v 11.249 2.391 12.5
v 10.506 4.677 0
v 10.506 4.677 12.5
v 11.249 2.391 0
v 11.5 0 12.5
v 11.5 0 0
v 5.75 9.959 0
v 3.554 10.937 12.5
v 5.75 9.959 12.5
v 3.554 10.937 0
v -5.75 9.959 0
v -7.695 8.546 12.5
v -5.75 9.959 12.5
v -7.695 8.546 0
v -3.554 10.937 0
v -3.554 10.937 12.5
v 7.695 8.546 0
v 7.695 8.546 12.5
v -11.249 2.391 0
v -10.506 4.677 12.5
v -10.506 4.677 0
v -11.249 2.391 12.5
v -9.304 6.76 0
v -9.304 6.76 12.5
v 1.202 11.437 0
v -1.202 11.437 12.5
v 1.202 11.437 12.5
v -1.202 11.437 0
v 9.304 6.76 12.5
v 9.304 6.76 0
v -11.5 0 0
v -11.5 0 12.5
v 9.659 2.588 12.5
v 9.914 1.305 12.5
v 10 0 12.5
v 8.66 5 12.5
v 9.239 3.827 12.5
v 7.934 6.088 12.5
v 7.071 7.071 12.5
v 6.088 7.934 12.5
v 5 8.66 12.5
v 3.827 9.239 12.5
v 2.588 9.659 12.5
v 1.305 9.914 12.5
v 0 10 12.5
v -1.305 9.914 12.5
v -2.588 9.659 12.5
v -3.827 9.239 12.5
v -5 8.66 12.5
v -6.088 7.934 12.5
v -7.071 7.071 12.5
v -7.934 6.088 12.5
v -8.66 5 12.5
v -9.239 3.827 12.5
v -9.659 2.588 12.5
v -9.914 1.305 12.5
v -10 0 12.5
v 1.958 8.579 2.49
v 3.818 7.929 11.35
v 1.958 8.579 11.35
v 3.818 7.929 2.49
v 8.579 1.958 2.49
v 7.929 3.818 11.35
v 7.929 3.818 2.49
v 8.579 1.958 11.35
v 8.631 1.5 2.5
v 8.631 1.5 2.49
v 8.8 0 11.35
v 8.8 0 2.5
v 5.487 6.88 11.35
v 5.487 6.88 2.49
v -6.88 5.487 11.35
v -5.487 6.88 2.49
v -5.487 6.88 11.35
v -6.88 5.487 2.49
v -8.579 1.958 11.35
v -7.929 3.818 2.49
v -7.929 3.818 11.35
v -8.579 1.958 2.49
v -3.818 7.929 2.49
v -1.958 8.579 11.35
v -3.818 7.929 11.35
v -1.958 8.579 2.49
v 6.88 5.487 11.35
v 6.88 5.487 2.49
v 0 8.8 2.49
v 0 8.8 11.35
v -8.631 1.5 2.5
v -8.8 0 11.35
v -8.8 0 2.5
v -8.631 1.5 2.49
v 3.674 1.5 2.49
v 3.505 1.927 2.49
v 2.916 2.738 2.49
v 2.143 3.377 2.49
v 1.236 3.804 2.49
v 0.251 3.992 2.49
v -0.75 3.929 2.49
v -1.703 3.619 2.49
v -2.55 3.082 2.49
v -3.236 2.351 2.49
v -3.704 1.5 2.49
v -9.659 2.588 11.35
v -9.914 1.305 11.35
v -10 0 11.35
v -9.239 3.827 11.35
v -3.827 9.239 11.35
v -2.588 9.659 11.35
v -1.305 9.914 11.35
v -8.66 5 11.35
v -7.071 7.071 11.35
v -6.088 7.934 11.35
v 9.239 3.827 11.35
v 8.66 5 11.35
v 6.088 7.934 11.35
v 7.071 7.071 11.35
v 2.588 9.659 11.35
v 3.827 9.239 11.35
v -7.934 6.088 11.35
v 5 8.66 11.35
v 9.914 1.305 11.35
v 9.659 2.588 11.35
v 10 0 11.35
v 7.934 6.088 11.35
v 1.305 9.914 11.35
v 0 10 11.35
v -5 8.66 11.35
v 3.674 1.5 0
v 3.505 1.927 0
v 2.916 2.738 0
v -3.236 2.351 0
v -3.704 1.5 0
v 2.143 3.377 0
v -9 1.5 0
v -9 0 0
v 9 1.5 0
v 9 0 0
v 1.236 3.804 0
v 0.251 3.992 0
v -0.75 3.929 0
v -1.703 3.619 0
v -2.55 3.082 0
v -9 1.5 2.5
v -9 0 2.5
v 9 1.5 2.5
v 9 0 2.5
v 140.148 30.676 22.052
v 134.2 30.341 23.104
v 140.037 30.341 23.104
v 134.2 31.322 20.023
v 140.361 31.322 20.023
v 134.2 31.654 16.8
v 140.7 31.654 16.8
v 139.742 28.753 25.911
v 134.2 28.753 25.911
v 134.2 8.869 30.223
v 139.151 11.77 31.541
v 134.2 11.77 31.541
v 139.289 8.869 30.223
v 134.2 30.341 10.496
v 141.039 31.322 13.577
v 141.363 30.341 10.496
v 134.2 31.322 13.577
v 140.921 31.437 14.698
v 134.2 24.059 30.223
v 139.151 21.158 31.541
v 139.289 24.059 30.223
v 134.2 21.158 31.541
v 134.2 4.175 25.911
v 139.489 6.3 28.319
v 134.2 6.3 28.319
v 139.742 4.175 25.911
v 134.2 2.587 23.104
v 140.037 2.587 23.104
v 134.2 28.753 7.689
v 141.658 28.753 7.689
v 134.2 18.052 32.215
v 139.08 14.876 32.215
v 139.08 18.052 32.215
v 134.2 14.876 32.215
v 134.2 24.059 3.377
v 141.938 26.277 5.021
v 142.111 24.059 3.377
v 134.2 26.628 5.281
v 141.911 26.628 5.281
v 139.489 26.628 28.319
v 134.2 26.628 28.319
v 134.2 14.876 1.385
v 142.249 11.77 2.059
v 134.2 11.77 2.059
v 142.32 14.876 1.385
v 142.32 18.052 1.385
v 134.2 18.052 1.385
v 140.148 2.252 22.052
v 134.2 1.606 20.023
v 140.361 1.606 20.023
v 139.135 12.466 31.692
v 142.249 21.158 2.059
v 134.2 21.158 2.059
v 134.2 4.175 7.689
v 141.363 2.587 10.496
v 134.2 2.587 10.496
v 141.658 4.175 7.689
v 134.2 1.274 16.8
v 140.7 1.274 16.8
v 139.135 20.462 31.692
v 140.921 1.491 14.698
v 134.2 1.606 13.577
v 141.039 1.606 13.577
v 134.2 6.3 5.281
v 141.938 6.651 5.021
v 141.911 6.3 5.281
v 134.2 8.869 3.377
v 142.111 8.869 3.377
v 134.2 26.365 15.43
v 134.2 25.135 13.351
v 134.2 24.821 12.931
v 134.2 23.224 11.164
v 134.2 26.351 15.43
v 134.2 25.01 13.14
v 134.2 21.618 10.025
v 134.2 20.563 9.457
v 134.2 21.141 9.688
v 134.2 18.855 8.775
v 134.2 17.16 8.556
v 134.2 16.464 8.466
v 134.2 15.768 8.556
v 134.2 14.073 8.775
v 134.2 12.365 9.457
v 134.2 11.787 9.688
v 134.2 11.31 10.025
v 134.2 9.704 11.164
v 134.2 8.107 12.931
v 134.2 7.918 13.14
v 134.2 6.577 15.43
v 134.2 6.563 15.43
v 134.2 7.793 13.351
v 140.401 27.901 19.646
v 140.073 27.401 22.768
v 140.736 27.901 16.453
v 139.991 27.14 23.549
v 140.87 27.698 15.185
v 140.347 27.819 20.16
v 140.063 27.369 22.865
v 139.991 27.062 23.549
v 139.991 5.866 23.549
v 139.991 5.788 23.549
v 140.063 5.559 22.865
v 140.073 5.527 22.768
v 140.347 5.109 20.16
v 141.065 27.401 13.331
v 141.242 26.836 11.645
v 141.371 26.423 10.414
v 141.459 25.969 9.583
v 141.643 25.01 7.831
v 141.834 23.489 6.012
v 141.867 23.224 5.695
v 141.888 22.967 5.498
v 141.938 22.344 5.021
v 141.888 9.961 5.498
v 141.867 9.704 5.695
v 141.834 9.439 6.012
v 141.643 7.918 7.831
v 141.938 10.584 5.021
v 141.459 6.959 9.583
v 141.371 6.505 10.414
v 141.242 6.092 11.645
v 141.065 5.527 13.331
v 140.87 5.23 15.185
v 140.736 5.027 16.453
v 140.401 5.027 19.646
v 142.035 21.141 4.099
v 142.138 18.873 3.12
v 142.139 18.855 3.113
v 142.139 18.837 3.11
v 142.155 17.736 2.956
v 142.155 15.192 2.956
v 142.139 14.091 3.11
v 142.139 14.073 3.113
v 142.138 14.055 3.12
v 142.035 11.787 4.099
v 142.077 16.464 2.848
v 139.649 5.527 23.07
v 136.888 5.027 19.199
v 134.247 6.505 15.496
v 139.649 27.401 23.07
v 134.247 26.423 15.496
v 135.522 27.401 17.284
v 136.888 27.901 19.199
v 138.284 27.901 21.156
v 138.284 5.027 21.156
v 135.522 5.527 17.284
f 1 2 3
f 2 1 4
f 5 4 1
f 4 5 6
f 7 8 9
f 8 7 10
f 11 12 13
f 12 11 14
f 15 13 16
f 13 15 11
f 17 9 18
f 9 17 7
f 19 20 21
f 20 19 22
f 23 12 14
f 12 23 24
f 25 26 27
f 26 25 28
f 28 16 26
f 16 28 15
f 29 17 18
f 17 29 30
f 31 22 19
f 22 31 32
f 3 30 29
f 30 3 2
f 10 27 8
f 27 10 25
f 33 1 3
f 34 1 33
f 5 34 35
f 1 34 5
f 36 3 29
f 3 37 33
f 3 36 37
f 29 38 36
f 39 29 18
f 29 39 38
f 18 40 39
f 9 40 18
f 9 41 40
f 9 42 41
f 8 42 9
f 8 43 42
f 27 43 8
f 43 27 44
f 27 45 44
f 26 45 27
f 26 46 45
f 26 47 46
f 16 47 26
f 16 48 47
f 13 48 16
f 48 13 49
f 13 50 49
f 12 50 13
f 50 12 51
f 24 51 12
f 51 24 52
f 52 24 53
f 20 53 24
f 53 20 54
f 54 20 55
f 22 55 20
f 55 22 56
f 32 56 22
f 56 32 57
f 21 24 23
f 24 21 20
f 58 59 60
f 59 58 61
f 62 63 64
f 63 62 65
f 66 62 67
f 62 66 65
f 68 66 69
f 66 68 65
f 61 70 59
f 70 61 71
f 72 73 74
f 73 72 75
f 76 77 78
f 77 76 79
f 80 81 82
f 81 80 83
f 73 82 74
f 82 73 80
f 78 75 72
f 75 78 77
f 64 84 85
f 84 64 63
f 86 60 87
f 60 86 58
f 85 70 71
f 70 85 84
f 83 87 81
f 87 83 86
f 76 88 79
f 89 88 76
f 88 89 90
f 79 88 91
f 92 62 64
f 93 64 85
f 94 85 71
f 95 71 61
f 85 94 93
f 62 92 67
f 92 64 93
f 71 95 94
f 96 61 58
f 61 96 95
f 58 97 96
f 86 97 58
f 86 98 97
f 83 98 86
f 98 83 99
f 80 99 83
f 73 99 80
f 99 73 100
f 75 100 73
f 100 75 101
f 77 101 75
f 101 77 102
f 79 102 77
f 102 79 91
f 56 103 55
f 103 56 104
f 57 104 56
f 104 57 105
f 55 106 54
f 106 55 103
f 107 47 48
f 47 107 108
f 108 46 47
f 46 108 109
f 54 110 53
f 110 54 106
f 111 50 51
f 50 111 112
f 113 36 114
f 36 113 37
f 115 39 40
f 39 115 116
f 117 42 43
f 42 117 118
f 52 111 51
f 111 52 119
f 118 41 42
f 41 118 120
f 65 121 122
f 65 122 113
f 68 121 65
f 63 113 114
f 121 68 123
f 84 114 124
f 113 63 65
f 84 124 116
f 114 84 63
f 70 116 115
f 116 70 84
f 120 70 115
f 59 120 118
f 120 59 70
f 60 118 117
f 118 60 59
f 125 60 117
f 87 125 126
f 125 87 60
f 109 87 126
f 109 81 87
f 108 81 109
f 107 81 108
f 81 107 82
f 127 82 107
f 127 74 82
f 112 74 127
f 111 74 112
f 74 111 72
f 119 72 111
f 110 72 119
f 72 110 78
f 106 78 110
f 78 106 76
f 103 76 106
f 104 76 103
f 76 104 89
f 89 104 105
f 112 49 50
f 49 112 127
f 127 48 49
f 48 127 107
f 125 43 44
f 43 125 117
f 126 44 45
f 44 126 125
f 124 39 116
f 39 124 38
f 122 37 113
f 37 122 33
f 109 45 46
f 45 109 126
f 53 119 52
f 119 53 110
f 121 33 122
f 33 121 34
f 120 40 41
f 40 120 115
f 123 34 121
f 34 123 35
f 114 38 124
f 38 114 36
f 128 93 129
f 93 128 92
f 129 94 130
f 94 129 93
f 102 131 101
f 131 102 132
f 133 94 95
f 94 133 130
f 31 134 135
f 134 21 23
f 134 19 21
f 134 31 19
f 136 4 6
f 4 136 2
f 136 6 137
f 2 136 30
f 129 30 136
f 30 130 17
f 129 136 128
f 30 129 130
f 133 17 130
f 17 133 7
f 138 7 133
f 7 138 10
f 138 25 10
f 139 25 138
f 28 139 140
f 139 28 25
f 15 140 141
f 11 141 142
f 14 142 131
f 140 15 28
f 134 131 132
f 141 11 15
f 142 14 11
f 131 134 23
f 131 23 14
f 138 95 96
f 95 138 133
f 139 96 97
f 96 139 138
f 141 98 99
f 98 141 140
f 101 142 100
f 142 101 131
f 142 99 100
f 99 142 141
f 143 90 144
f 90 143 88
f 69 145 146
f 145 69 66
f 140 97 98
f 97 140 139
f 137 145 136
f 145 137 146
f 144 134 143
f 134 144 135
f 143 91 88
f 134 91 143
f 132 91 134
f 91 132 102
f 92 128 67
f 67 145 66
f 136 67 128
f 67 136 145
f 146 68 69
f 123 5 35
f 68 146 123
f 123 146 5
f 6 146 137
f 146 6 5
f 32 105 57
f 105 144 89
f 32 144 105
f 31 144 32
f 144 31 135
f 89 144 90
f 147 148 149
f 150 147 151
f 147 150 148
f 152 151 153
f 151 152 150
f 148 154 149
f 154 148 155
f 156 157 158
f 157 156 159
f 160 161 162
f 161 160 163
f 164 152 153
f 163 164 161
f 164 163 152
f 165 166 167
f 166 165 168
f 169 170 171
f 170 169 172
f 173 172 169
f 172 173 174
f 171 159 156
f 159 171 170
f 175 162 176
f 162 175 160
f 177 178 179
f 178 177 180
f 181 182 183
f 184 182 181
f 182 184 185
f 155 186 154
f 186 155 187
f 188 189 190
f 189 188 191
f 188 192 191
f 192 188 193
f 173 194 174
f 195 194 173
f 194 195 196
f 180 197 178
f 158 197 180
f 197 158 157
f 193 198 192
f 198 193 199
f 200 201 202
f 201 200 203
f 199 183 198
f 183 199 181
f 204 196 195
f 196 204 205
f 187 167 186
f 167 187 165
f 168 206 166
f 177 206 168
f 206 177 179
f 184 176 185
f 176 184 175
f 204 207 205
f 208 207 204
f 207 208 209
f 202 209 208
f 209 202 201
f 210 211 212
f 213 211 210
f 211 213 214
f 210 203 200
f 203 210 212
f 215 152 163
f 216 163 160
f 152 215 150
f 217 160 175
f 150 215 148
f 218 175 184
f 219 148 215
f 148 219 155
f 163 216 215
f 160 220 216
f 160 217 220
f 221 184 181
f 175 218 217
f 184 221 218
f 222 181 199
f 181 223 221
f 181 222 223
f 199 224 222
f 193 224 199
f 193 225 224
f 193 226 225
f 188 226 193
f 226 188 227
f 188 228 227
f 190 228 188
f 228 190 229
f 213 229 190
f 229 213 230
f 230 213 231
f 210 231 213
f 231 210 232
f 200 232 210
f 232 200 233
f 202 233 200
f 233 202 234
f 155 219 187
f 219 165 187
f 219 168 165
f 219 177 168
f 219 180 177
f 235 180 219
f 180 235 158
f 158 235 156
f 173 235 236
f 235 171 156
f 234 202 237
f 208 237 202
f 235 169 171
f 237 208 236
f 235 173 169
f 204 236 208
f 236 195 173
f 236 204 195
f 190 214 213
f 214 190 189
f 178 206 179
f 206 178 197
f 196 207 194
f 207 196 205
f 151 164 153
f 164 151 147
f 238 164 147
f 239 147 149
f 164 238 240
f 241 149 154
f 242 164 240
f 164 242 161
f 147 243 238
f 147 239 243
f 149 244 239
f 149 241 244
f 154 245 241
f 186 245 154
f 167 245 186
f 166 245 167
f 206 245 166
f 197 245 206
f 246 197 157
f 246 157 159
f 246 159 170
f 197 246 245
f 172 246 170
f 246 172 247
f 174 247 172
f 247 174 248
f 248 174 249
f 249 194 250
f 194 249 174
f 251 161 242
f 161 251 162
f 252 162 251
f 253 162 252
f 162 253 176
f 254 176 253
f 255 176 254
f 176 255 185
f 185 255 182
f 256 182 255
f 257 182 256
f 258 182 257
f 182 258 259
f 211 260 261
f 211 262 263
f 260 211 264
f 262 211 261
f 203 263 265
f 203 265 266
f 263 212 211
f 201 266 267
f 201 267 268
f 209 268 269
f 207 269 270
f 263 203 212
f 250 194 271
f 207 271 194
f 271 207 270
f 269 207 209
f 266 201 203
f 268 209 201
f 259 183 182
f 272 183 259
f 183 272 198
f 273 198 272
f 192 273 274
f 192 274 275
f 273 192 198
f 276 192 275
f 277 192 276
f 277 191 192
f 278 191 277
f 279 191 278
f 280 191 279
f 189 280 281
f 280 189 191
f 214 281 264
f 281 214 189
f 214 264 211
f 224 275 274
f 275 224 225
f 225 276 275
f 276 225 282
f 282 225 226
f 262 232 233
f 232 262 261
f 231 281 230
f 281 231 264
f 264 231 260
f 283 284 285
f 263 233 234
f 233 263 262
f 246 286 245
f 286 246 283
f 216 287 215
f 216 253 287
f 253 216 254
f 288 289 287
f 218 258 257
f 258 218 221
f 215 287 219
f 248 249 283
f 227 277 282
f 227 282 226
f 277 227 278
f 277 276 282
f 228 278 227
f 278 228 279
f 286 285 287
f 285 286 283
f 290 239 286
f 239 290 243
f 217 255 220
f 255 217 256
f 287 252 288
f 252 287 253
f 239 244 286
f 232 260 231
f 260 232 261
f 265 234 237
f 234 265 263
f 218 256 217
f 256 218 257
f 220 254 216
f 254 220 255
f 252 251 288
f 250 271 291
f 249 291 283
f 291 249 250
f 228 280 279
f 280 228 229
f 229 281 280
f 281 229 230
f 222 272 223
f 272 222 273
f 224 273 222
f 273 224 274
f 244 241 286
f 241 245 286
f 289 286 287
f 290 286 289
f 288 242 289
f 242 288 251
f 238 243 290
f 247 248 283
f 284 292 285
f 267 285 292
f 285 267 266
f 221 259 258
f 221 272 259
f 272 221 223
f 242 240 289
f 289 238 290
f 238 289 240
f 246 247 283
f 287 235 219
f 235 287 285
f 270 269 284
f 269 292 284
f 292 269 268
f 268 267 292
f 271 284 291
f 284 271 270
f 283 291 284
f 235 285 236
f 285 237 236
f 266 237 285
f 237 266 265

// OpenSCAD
// file: 20mm_star_lens_carrier.scad
// Lens
lens_ridge_d = 20;
lens_ridge_l = 1.15;

lens_front_d = 17.6;
lens_front_l = 1;

lens_cone_l = 11 - (lens_ridge_l + lens_front_l);

lens_aperture_d = 6;

lens_total_l = lens_cone_l + lens_ridge_l + lens_front_l;

// LED Star Board
board_d = 20;
board_t = 1.22;
castelations = 6;
castelation_r = 2.5;

led_d = 8;
led_h = 2.5; // just body, not bubble
led_lead_w = 3;
led_lead_l = 1.5;
led_bubble_d = 5.5;

// other

// housing_addt = 1;
housing_addt = 0;
// housing_l = lens_total_l+board_t+led_h + housing_addt;
housing_l = lens_cone_l+lens_ridge_l+board_t+led_h + housing_addt;
housing_d = lens_ridge_d + 2;

ff = 0.01;

module lens() {
  cylinder(d=lens_front_d, h=lens_front_l);
  translate([0, 0, lens_front_l]) {
    cylinder(d=lens_ridge_d, h=lens_ridge_l, $fn=48);
      translate([0, 0, lens_ridge_l]) {
        cylinder(d2=lens_aperture_d, d1=lens_front_d, h=lens_cone_l);
      }
  }
}

module star_board(include_castelations=true) {
  difference() {
    cylinder(d=board_d, h=board_t, $fn=48);
    if (include_castelations) {
      for(deg=[0:(360/castelations):360]) {
        rotate([0, 0, deg]) translate([board_d/2, 0, -ff]) cylinder(r=castelation_r, h=board_t+(ff*2));
      }
    }
  }
  translate([0, 0, board_t]) led();
}

module led() {
  cylinder(d=led_d, h=led_h, $fn=25);
  translate([-((led_lead_l*2)+led_d)/2, -led_lead_w/2, 0]) cube([(led_lead_l*2)+led_d, led_lead_w, led_h]);
  translate([0, 0, led_h]) sphere(d=led_bubble_d, $fn=16);
}

module lens_and_led(include_castelations=true) {
  translate([0, 0, lens_total_l+board_t+led_h]) rotate([0, 180, 0]) lens();
  star_board(include_castelations);
}

module housing_cutouts_mock() {
  // pcb cutout
    translate([0, 0, 0]) cylinder(d=board_d, h=board_t);
    // ridge cutout
    translate([0, 0, board_t+led_h+lens_cone_l]) cylinder(d=lens_ridge_d, h=lens_ridge_l);
    // led cutout
    translate([0, 0, board_t]) led();
}

module housing_cutouts_real() {
  translate([0, 0, 0])
      lens_and_led(include_castelations=false);
}

module housing() {
  difference() {
    union() {
      difference() {
        cylinder(d=housing_d, h=housing_l);

        // centre channel
        translate([0, 0, -ff]) cylinder(d=lens_front_d, h=housing_l+(ff*2));
      }

      translate([0, 0, board_t]) {
        cylinder(d=lens_front_d, h=led_h-ff);
      }
    }

    translate([0, 0, housing_addt])
      // housing_cutouts_mock();
      housing_cutouts_real();
  }

}

// lens();
// led();
// star_board();
// translate([0, 0, housing_addt])
//   %lens_and_led();
intersection() {
  translate([-housing_d/2, 0, 0]) cube([housing_d, housing_d/2, housing_l+(ff*2)]);
  translate([0, 0, -board_t])
    housing();
}
// file: 20mm_star_lens.scad
/*
  For 20mm * 11mm PMMA TIR lenses like: https://www.amazon.com/gp/product/B07VZL6N2Z/

  Replaces/replicates the white plastic plastic housing that comes with the lenses.

  For starboard COB leds like: https://www.amazon.com/gp/product/B07DHB61BH/

  Assumes the main LED body will be ~8mm * 2.5mm (excluding "bubble")
*/
include <common.scad>;

// Lens
lens_ridge_d = 20;
lens_ridge_l = 1.15;

lens_front_d = 17.6;
lens_front_l = 1;

lens_cone_l = 11 - (lens_ridge_l + lens_front_l);

lens_aperture_d = 6;

lens_total_l = lens_cone_l + lens_ridge_l + lens_front_l;

// LED Star Board
board_d = 20;
board_t = 1.22;
castelations = 6;
castelation_r = 2.5;

led_d = 8.25;
led_h = 2.5; // just body, not bubble
led_lead_w = 4;
led_lead_l = 3;
led_bubble_d = 5.5;


module lens() {
  cylinder(d=lens_front_d, h=lens_front_l);
  translate([0, 0, lens_front_l]) {
    cylinder(d=lens_ridge_d, h=lens_ridge_l, $fn=48);
      translate([0, 0, lens_ridge_l]) {
        cylinder(d2=lens_aperture_d, d1=lens_front_d, h=lens_cone_l);
      }
  }
}

module star_board(include_castelations=true, ghost_pcb=false) {
  difference() {
    if (ghost_pcb) {
      %cylinder(d=board_d, h=board_t, $fn=48);
    } else {
      cylinder(d=board_d, h=board_t, $fn=48);
    }

    if (include_castelations) {
      for(deg=[0:(360/castelations):360]) {
        rotate([0, 0, deg]) translate([board_d/2, 0, -ff]) cylinder(r=castelation_r, h=board_t+(ff*2));
      }
    }
  }
  translate([0, 0, board_t]) led();
}

module led() {
  cylinder(d=led_d, h=led_h, $fn=32);
  translate([-((led_lead_l*2)+led_d)/2, -led_lead_w/2, 0]) cube([(led_lead_l*2)+led_d, led_lead_w, led_h]);
  translate([0, 0, led_h]) sphere(d=led_bubble_d, $fn=16);
}

module lens_and_led(include_castelations=true, include_cone=false, ghost_pcb=false) {
  translate([0, 0, lens_total_l+board_t+led_h]) rotate([0, 180, 0]) lens();
  star_board(include_castelations, ghost_pcb);

  if (include_cone) {
    // r / h = degrees
    cone_h = led_h*10;
    cone_base_r = cone_h / tan(60); // make cone with 60 degree angle
    %translate([0, 0, board_t+led_h]) cylinder(d1=led_bubble_d, d2=cone_base_r*2, h=cone_h);
  }
}

// lens_and_led(include_cone=true);
// file: common.scad
cavity_d = 27.75; // abs
cavity_l = 85; // length to castelations at bottom. Length including those is more like 122mm

outer_ridge_d = 31;
outer_ridge_min_t = 4.5;
outer_ridge_max_t = 8.5;

locating_pin_h = 3.5;
locating_pin_w = 2.6; // abs

outer_d = cavity_d * 1.2;
outer_l = cavity_l * 1.1;

ff = 0.01;
// main file
include <common.scad>;
include <20mm_star_lens.scad>;
include <20mm_star_lens_carrier.scad>;
led_lead_l = 5;

cavity_d = 28;
cavity_l = 122;

outer_ridge_d = 31;
outer_ridge_min_t = 4.5;
outer_ridge_max_t = 8.5;

locating_pin_h = 3;
locating_pin_w = 2.2;

outer_d = cavity_d * 1.2;
outer_l = cavity_l * 1.1;

housing_d = lens_ridge_d + 3;

module handle() {
  translate([0, outer_d/2, outer_d/2]) rotate([0, 90, 0]) {
    difference() {
      cylinder(d=outer_d, h=outer_l);
      translate([0, 0, outer_l - cavity_l]) cylinder(d=cavity_d, h=cavity_l+ff);
    }

    // locating pin
    translate([(cavity_d/2)-((outer_d-cavity_d)/2), -locating_pin_w/2, 0]) cube([locating_pin_h, locating_pin_w, outer_l]);

    // outer ridge
    translate([0, 0, outer_l]) rotate([0, 0, 90]) difference() {
      cylinder(d=outer_ridge_d*1.2, h=outer_ridge_max_t);
      translate([0, 0, 5]) rotate([0, 0, 180]) rotate([6, 0, 0]) cylinder(d=outer_ridge_d*1.3, h=outer_ridge_max_t);
      translate([0, 0, -ff]) cylinder(d=outer_ridge_d, h=outer_ridge_max_t+(ff*2));
    }
  }
}

module handle_cross_section() {
  difference() {
    handle();
    translate([-ff, -outer_d/2, -outer_d/4]) cube([outer_l+outer_ridge_max_t+(ff*2), outer_d, outer_d*2]);
  }
}

// // simulate handle height while walking
// translate([0, 0, 30*25.4])
// // simulate handle angle while walking
// rotate([0, -8, 0])
  /*
    * 60 degree lens
      * 8 deg handle angle
        * 30 inches high
          * 20 degree lens angle,
            * beam hits the ground at about 40 inches (3.3ft) from user.
          * 25 degree lens angle,
            * beam hits the ground at about 35 inches (2.9ft) from user.
          * 35 degree lens angle,
            * beam hits ground at about 25.5 inches (2.1ft) from user, midpoint at 5.5 feet.

  */
union() {
  %handle_cross_section();

  lens_angle = 35.5;

  housing_y_offset = (outer_d - housing_d)/2;

  // translate([outer_l-housing_l, 0, 4])
  // translate([3.6, 0, 0]) rotate([0,lens_angle,0])
  // translate([0, outer_d/2, outer_d/2]) rotate([0, 90, 0]) {
  //   scale([1,1,1]) {
  //     housing_cross_section();

  //     // r / h = degrees
  //     cone_h = led_h*10;
  //     cone_base_r = cone_h / tan(60); // make cone with 60 degree angle
  //     %translate([0, 0, 0]) cylinder(d1=0, d2=cone_base_r*2, h=cone_h);
  //     %color("blue") cylinder(d=1, h=cone_h);
  //   }
  // }

  difference() {
    scale([1, 0.98, 1]) translate([0, outer_d/2, outer_d/2]) rotate([0, 90, 0]) translate([0, 0, outer_l]) rotate([0, 0, 90]) difference() {
        cylinder(d=outer_ridge_d, h=outer_ridge_max_t);
        translate([0, 0, 6.5]) rotate([0, 0, 180]) rotate([6, 0, 0]) cylinder(d=outer_ridge_d*1.3, h=outer_ridge_max_t);
        // translate([0, 0, -ff]) cylinder(d=outer_ridge_d, h=outer_ridge_max_t+(ff*2));
      }

    translate([0, -(outer_d*0.02)/2, 0])
    translate([outer_l-housing_l, 0, 6.5])
    translate([7.35, 0, 0]) rotate([0,lens_angle,0])
    translate([0, outer_d/2, outer_d/2]) rotate([0, 90, 0]) {
      // translate([0, 0, -housing_l/4])
      // cylinder(d=housing_d, h=housing_l*1.25, center=false);
      cylinder(d=housing_d, h=housing_l, center=false);
    }
  }
}
